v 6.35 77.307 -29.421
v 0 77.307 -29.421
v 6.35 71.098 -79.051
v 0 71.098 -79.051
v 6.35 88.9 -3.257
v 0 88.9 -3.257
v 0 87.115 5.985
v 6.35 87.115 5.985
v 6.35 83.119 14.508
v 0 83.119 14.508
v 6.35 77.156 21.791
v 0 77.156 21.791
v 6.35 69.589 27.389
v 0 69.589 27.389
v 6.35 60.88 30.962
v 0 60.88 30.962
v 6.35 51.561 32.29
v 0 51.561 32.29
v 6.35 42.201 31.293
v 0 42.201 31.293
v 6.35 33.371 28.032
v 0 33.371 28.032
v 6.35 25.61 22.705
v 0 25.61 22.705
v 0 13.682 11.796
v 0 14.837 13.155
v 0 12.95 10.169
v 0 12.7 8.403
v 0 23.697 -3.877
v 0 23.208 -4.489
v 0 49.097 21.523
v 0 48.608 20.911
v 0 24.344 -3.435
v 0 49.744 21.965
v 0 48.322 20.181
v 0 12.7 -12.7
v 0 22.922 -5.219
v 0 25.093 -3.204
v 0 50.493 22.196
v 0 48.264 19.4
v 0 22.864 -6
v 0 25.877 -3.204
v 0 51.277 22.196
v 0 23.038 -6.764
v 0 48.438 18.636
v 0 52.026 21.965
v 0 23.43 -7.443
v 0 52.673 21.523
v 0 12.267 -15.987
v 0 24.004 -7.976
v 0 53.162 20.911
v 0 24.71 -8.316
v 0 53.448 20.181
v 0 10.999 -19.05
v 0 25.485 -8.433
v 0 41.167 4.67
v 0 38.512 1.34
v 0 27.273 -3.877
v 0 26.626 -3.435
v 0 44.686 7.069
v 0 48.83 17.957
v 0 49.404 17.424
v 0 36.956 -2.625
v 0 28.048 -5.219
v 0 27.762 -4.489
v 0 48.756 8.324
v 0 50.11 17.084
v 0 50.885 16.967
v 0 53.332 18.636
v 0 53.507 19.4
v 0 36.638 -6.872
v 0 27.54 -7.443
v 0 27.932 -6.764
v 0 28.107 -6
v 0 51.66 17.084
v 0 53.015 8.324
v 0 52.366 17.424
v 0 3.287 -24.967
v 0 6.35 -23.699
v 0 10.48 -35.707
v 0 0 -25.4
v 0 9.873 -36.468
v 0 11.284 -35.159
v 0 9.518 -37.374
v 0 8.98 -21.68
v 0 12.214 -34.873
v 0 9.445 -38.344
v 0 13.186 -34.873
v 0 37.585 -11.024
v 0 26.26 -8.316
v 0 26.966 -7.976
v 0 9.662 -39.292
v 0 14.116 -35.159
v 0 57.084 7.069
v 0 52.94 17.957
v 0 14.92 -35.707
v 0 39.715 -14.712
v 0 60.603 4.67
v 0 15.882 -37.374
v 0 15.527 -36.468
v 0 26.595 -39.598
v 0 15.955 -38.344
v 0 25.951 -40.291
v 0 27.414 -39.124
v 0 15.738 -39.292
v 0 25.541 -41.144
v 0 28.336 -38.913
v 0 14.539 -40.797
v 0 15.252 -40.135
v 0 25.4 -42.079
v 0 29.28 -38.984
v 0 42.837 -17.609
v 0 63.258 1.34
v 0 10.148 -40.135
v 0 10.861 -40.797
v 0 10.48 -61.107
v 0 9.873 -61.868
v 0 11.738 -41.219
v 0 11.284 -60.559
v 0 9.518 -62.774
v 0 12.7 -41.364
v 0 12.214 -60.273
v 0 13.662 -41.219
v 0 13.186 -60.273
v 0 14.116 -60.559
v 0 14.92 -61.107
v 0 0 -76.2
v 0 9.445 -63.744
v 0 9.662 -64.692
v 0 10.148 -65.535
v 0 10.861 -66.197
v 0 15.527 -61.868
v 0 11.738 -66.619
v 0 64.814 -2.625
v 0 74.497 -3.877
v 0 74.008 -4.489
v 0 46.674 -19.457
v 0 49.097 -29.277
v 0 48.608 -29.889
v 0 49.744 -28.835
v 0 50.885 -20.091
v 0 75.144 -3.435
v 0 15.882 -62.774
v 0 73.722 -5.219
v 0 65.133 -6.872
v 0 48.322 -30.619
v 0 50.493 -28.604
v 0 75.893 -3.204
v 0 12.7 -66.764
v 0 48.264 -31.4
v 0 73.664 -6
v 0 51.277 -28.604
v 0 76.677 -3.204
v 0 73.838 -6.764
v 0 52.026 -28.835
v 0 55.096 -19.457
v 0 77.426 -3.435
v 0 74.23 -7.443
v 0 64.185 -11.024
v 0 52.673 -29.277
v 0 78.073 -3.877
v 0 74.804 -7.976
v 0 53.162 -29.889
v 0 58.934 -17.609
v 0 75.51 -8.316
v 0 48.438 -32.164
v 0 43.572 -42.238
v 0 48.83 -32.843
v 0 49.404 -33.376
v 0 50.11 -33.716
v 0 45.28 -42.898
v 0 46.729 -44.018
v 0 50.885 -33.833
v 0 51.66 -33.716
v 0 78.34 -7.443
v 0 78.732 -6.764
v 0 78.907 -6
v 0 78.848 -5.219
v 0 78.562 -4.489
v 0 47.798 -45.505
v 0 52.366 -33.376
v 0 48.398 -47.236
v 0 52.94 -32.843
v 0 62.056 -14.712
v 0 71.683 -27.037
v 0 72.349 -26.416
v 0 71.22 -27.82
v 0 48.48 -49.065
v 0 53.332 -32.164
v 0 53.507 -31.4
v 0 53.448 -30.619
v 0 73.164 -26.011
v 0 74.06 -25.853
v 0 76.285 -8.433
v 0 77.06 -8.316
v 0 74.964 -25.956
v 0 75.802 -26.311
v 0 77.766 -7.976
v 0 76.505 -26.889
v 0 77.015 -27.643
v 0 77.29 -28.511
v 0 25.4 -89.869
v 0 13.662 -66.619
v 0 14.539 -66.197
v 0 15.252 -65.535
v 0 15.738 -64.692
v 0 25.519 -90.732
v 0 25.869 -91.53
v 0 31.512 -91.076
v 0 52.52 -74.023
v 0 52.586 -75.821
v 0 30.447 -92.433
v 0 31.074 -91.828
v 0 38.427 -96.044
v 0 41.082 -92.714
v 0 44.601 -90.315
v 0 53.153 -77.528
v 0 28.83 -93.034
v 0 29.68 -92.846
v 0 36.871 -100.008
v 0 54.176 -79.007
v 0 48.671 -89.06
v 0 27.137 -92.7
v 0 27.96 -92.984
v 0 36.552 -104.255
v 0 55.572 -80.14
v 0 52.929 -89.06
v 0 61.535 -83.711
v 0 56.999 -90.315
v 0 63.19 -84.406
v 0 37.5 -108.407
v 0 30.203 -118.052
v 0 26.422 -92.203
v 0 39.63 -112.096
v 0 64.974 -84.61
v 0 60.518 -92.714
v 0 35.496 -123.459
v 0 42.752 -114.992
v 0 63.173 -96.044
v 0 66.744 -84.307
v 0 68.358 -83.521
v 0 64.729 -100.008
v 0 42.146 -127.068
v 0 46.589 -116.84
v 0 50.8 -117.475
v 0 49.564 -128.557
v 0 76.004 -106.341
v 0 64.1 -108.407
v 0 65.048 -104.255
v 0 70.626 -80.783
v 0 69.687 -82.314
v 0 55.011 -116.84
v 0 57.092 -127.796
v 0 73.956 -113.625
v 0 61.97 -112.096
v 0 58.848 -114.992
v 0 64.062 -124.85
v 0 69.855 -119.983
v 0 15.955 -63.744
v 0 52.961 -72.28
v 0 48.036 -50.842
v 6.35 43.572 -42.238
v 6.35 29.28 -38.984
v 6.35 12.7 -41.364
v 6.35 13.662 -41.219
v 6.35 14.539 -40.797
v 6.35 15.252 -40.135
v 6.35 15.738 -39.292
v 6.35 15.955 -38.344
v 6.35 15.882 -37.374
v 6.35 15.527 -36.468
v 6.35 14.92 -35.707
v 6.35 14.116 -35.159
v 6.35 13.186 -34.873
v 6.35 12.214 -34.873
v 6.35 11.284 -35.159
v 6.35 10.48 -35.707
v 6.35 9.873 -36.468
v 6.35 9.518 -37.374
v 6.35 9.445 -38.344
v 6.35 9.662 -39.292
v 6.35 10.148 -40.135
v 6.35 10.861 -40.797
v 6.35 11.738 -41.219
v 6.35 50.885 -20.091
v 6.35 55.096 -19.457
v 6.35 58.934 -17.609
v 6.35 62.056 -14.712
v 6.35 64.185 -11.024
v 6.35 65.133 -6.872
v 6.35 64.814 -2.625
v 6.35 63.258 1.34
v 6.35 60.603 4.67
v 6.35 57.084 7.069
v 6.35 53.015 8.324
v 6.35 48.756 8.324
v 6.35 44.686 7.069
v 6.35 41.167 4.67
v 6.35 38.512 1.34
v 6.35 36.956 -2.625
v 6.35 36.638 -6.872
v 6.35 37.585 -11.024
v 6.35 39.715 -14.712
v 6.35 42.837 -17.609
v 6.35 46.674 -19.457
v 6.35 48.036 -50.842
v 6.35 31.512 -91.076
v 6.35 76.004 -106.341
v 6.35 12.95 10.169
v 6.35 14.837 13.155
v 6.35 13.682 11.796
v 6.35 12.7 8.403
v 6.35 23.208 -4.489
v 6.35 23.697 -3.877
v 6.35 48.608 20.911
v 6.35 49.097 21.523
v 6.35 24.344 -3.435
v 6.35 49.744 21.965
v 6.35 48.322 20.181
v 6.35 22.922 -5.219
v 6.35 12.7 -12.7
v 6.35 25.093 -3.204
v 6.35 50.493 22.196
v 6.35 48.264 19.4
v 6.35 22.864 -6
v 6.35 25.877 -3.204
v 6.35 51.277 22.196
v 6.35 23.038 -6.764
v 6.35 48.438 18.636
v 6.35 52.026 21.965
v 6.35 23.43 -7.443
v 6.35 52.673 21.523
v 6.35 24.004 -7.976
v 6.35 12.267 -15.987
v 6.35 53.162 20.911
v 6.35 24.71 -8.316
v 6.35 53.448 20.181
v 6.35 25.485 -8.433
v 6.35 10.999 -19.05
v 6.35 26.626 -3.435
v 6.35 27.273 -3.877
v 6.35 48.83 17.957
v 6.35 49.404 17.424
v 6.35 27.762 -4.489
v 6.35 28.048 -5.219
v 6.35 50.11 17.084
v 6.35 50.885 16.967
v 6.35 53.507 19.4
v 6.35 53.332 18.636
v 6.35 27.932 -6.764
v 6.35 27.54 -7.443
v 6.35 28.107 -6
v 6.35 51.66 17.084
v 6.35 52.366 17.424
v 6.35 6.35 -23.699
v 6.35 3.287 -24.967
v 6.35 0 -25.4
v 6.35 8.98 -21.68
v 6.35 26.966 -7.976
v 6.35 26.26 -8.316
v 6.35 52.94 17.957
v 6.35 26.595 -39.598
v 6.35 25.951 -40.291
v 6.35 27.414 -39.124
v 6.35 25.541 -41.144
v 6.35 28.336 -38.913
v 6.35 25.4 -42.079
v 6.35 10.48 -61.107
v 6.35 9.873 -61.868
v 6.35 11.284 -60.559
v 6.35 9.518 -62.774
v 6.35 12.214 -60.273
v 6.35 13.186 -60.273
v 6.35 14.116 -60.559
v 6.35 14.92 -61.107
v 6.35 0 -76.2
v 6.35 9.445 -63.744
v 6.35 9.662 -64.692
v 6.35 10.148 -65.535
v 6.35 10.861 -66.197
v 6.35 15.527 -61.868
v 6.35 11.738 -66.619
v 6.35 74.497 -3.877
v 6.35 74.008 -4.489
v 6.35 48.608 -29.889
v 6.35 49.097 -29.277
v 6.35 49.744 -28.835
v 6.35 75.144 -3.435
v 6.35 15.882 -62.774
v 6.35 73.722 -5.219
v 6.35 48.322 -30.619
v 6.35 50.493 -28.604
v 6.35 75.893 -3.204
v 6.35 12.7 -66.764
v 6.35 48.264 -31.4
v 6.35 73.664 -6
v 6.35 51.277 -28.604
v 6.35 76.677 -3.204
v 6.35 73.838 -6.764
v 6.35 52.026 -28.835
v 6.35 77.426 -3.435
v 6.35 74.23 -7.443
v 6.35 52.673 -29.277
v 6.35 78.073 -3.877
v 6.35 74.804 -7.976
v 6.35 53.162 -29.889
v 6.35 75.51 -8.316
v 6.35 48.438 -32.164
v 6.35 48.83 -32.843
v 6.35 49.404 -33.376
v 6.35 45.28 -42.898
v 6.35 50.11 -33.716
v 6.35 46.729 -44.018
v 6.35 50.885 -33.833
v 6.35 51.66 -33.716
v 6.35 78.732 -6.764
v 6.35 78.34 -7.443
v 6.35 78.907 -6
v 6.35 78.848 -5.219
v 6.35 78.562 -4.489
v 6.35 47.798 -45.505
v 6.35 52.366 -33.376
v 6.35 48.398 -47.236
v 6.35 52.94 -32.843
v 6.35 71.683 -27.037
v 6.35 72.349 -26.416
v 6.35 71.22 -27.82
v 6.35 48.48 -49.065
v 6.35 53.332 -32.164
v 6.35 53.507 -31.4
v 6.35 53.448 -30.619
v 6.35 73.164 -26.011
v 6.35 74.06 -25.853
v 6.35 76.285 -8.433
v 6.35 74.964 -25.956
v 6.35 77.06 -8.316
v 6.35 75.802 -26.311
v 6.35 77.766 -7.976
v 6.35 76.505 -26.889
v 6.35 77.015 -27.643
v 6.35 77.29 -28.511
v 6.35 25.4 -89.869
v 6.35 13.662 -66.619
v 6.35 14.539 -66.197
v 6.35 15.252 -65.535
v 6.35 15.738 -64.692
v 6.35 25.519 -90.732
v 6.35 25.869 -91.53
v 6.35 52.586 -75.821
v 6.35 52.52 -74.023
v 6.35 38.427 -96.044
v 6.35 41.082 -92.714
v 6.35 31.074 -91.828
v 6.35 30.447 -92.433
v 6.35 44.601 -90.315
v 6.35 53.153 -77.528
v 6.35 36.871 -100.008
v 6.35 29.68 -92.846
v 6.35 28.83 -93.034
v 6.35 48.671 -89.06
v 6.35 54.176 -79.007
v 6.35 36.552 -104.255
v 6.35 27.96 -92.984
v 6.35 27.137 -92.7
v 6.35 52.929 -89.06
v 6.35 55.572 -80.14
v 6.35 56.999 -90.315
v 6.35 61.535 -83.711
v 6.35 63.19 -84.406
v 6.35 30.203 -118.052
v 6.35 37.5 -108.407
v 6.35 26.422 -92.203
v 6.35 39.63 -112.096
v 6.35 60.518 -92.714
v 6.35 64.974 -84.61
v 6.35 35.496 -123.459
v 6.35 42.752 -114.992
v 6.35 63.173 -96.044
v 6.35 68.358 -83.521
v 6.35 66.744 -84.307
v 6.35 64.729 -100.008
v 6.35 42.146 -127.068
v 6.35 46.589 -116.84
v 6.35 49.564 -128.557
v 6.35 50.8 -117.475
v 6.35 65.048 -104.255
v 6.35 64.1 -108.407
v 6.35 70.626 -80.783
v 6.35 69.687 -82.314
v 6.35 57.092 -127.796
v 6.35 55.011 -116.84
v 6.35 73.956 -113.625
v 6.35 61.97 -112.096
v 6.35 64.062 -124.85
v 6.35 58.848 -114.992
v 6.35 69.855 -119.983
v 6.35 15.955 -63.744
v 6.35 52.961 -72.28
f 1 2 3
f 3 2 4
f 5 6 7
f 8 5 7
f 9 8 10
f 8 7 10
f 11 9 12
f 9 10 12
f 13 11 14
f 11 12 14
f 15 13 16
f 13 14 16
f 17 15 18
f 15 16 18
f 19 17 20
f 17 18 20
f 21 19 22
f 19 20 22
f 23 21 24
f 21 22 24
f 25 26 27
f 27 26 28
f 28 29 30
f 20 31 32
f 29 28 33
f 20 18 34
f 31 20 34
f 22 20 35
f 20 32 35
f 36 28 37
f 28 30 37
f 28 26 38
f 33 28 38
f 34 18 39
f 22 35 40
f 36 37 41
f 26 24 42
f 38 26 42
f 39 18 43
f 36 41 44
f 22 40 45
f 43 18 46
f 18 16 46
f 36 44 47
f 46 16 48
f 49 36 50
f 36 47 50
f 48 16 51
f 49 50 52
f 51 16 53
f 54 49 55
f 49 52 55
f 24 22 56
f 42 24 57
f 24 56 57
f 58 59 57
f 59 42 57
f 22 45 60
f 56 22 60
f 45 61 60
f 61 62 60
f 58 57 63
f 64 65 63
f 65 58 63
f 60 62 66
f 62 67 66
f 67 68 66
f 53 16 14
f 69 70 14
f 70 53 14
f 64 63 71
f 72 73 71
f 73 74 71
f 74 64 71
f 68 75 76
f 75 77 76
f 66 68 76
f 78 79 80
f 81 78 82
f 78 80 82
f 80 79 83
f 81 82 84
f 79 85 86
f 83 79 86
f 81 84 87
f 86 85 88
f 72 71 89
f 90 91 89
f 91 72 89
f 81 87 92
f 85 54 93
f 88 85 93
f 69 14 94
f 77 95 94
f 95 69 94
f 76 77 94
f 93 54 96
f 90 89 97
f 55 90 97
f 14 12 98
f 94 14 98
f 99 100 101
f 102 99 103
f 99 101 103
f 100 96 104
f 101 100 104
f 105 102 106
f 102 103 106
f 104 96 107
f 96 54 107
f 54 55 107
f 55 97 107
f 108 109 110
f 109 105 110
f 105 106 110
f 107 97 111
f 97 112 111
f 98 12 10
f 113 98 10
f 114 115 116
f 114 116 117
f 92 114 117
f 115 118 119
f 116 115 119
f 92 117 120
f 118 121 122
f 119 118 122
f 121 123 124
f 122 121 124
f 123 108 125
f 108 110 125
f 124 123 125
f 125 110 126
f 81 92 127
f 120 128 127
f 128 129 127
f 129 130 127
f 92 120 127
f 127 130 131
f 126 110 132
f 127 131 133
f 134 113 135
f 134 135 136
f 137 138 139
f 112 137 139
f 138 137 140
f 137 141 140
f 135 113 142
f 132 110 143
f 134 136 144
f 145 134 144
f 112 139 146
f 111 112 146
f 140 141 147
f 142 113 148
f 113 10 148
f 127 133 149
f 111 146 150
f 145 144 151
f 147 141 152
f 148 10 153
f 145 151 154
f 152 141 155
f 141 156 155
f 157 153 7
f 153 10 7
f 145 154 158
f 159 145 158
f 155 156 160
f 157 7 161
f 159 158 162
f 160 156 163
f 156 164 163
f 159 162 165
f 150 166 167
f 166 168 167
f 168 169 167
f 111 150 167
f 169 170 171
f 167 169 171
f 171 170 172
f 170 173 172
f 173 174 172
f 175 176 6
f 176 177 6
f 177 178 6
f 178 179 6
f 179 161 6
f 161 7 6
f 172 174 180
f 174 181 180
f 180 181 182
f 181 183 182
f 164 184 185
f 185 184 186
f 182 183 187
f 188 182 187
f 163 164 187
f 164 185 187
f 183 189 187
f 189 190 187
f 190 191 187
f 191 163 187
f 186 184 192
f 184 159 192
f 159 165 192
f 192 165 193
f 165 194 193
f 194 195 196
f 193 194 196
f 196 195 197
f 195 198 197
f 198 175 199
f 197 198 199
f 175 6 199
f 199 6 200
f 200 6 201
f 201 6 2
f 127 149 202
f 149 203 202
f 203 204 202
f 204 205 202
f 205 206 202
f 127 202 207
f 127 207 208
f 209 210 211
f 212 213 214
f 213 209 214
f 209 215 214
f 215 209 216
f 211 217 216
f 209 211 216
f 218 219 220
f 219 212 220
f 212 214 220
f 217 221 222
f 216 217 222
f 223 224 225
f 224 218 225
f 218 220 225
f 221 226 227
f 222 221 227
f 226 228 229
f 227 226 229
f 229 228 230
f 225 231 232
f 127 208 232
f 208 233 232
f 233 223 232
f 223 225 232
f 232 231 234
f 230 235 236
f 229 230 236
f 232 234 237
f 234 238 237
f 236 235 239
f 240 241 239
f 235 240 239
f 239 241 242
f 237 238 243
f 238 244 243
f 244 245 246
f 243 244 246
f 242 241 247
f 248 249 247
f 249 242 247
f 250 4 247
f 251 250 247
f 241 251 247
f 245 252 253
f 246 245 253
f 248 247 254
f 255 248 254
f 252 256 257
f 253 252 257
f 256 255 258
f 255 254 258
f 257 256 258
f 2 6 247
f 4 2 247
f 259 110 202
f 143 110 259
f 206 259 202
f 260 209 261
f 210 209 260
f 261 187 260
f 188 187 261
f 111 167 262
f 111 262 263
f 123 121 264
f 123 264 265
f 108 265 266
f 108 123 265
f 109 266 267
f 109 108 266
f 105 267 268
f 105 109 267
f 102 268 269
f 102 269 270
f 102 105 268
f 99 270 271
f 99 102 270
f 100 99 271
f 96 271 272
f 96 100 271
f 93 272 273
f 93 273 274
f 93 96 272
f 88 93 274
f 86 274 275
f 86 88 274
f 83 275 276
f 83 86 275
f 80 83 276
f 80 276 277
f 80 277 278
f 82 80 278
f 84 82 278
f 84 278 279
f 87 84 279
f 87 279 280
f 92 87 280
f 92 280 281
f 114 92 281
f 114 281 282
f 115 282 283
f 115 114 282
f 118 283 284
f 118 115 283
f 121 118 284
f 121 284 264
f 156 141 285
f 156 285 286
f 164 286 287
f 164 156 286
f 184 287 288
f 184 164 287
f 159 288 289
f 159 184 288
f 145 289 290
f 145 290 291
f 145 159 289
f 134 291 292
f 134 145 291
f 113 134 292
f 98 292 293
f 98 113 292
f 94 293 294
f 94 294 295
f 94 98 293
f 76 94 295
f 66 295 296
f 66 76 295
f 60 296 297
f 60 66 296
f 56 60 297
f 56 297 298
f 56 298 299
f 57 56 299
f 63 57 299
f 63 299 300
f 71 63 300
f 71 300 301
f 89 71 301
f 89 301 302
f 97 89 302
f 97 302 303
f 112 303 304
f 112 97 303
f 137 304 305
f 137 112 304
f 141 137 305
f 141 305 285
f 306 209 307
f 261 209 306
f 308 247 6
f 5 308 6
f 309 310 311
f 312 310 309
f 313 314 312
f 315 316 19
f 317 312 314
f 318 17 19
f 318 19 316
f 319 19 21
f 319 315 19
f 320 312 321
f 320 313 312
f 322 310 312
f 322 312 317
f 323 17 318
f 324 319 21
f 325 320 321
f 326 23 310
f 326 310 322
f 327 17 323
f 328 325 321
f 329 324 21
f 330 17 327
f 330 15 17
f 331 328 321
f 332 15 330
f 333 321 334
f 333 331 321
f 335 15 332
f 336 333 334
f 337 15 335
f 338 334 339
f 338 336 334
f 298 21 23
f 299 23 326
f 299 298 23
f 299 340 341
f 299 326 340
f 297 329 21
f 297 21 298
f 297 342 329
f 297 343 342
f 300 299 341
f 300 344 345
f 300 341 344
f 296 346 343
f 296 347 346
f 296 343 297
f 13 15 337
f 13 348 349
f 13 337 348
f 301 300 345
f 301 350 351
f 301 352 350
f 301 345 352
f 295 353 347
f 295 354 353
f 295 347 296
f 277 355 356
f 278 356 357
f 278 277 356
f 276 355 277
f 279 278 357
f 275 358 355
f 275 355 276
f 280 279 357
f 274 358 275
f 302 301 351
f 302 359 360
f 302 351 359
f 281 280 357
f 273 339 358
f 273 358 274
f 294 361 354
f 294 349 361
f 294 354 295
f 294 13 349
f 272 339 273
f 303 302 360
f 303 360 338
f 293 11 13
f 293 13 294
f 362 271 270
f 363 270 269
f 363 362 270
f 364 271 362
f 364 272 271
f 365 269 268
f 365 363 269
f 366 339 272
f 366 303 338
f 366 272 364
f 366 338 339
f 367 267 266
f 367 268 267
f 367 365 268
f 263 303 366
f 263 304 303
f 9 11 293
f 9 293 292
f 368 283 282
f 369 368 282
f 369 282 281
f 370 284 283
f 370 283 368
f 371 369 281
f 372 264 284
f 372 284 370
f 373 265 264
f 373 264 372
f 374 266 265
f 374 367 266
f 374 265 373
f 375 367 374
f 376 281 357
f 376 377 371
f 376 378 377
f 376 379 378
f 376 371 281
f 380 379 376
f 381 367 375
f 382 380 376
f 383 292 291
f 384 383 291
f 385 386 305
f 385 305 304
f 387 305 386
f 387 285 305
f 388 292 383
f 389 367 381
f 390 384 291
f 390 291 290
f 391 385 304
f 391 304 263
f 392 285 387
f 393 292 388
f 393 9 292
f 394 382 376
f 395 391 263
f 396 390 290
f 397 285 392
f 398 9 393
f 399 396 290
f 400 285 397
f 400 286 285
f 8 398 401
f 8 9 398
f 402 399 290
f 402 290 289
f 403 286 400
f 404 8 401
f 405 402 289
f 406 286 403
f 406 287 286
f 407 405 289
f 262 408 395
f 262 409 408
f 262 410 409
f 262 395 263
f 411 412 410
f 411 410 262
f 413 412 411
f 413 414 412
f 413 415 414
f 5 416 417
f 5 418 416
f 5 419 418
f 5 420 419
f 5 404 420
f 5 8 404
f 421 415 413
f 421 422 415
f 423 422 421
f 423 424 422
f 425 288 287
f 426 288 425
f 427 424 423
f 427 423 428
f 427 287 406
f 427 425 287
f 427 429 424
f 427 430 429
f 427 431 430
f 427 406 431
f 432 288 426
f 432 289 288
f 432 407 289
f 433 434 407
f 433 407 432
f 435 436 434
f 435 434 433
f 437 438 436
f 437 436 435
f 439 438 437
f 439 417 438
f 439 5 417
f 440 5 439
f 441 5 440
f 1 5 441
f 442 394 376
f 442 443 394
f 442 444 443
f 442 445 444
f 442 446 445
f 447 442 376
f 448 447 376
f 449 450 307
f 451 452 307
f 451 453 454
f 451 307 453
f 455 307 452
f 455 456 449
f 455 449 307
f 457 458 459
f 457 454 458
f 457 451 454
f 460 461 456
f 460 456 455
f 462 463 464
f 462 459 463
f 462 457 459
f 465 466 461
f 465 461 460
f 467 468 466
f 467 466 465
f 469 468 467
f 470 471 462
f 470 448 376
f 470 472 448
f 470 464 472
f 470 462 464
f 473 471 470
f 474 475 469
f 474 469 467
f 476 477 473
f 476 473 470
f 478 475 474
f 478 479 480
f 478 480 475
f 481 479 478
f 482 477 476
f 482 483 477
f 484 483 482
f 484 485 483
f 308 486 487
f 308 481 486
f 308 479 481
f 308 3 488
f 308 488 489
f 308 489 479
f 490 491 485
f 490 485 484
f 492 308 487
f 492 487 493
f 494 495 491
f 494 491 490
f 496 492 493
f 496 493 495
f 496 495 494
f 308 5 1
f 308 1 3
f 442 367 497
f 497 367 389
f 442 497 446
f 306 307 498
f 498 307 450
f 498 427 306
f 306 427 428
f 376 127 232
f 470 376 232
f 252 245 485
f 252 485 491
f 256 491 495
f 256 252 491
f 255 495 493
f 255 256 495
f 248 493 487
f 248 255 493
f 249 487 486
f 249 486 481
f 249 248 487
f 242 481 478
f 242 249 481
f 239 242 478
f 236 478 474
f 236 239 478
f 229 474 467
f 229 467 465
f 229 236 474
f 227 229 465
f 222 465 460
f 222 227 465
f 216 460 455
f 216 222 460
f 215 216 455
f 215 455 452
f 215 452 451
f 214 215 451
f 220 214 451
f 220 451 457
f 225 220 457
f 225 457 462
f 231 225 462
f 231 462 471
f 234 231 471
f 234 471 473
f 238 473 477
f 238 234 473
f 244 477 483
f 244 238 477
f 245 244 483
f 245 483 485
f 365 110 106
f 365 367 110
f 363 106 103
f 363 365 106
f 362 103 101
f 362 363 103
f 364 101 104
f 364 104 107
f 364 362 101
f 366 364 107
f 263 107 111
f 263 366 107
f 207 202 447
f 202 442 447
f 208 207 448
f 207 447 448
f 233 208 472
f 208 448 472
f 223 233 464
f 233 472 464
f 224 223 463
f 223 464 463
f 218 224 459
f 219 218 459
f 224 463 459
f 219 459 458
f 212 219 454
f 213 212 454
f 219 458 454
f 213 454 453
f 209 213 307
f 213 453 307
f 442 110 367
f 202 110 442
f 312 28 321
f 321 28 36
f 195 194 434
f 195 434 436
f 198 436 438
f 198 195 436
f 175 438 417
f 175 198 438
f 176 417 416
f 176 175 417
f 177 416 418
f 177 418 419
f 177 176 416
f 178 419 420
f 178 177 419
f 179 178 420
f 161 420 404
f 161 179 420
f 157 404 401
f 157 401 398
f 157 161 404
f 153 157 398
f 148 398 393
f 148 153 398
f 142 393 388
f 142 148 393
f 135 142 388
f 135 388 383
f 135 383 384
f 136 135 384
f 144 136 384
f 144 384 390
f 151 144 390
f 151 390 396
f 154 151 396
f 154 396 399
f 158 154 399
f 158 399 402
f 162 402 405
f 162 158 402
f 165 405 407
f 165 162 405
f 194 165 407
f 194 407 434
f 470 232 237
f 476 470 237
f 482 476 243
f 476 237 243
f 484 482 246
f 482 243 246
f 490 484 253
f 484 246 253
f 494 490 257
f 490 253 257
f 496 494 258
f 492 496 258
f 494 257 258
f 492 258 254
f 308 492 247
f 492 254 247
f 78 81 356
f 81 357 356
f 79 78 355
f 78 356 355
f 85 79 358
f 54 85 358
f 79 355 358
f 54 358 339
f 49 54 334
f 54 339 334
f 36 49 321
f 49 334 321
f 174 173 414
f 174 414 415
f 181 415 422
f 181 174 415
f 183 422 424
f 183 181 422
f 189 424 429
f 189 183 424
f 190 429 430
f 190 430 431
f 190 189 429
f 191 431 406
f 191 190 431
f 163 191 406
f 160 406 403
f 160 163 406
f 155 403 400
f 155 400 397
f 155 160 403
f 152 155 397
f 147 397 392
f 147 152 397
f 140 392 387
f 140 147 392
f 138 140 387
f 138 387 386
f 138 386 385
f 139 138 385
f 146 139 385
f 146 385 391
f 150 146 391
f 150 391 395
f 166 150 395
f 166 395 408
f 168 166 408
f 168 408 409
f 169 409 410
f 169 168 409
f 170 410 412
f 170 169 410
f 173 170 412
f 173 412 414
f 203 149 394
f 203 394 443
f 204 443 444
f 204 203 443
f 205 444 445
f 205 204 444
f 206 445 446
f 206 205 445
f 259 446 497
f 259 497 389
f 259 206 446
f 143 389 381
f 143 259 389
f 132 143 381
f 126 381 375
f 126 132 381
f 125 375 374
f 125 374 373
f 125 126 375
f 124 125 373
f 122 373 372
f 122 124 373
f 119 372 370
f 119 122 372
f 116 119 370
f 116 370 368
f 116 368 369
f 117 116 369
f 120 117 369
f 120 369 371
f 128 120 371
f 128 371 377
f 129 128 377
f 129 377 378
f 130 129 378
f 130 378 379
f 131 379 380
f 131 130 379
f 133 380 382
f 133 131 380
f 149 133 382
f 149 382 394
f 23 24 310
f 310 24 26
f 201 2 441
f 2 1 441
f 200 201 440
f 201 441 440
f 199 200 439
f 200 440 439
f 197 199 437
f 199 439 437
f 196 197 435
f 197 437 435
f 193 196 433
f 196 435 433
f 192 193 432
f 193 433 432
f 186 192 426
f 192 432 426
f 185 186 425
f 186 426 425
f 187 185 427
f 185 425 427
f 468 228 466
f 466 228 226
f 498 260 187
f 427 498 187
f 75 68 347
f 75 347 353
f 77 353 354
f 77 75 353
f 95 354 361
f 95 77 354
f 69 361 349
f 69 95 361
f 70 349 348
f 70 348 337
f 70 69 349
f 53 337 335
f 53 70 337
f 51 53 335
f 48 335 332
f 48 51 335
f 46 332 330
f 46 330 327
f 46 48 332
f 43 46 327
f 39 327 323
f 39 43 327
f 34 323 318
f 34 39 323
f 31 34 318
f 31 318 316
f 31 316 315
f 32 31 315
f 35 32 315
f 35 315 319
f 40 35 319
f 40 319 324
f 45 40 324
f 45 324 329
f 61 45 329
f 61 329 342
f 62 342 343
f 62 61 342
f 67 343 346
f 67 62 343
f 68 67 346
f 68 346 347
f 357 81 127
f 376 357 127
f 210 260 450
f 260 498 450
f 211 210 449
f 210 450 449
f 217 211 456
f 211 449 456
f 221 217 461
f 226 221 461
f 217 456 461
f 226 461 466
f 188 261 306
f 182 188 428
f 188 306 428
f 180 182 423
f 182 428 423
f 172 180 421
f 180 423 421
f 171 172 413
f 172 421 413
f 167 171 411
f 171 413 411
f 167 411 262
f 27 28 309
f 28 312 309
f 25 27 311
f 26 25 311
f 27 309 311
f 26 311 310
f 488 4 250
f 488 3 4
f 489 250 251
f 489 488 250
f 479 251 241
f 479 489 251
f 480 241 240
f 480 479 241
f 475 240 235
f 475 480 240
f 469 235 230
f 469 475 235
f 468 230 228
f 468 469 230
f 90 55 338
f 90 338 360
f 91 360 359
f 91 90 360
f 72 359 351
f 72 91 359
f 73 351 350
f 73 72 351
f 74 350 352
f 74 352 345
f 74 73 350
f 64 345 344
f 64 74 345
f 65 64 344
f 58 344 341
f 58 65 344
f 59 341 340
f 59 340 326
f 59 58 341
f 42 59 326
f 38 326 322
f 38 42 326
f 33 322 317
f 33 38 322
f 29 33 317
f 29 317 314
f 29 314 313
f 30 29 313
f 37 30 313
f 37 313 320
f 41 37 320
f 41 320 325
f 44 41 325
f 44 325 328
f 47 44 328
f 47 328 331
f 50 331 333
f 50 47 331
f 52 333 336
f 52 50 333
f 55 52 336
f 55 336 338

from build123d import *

# Parameters (mm, degrees)
SKETCH1_R           = 3.2639
SKETCH1_R_2         = 14.2875
SKETCH1_R_3         = 2.6289
BOSS_EXTRUDE1_DEPTH = 6.35
CUT_EXTRUDE1_DEPTH  = 6.35
CUT_EXTRUDE2_DEPTH  = 157.455309971
FILLET1_R           = 6.35
FILLET2_R           = 6.35
FILLET3_R           = 3.175
FILLET4_R           = 6.35
FILLET5_R           = 3.175
FILLET6_R           = 3.175
FILLET7_R           = 12.7
FILLET8_R           = 6.35


with BuildPart() as part:
    # Sketch1 → Boss-Extrude1 (new body)
    with BuildSketch(Plane(origin=(0, 0, 0), x_dir=(0, 0, -1), z_dir=(1, 0, 0))):
        with BuildLine():
            Line((0, 0), (76.2, 0))
            Line((76.2, 0), (118.05161028, 30.203441414))
            ThreePointArc((118.05161028, 30.203441414), (127.79577467, 57.092282399), (106.340627785, 76.003527237))
            Line((106.340627785, 76.003527237), (3.257374761, 88.899923295))
            ThreePointArc((3.257374761, 88.899923295), (-29.445545679, 65.344858986), (-22.705011853, 25.609644583))
            Line((-22.705011853, 25.609644583), (0, 0))
        make_face()
        with Locations((38.1, 12.7)):
            Circle(SKETCH1_R, mode=Mode.SUBTRACT)
        with Locations((63.5, 12.7)):
            Circle(SKETCH1_R, mode=Mode.SUBTRACT)
        with Locations((103.1875, 50.8)):
            Circle(SKETCH1_R_2, mode=Mode.SUBTRACT)
        with Locations((5.803937203, 50.885123286)):
            Circle(SKETCH1_R_2, mode=Mode.SUBTRACT)
        with Locations((5.803937203, 76.285123286)):
            Circle(SKETCH1_R_3, mode=Mode.SUBTRACT)
        with Locations((5.803937203, 25.485123286)):
            Circle(SKETCH1_R_3, mode=Mode.SUBTRACT)
        with Locations((31.203937203, 50.885123286)):
            Circle(SKETCH1_R_3, mode=Mode.SUBTRACT)
        with Locations((-19.596062797, 50.885123286)):
            Circle(SKETCH1_R_3, mode=Mode.SUBTRACT)
    extrude(amount=BOSS_EXTRUDE1_DEPTH)

    # Sketch2 → Cut-Extrude1 (cut)
    with BuildSketch(Plane.ZY):
        Polygon((0, 0), (-25.4, 0), (-25.4, 12.7), (0, 12.7), (11.95076388, 12.7), (11.95076388, 0), align=None)
    extrude(amount=-CUT_EXTRUDE1_DEPTH, mode=Mode.SUBTRACT)

    # Sketch3 → Cut-Extrude2 (cut, through all)
    with BuildSketch(Plane.ZY):
        Polygon((-105.957463546, 25.4), (-43.903937203, 50.885123286), (-38.1, 25.4), align=None)
        Polygon((-88.713516137, 69.889443956), (-77.333414898, 50.885123286), (-5.803937203, 80.261980092), align=None)
    extrude(amount=-CUT_EXTRUDE2_DEPTH, mode=Mode.SUBTRACT)

    # Fillet1
    fillet1_edges = [part.edges().sort_by_distance(p)[0] for p in [
        (3.175, 50.885123286, -77.333414898),
    ]]
    fillet(fillet1_edges, radius=FILLET1_R)

    # Fillet2
    fillet2_edges = [part.edges().sort_by_distance(p)[0] for p in [
        (3.175, 69.889443956, -88.713516137),
    ]]
    fillet(fillet2_edges, radius=FILLET2_R)

    # Fillet3
    fillet3_edges = [part.edges().sort_by_distance(p)[0] for p in [
        (3.175, 80.261980092, -5.803937203),
    ]]
    fillet(fillet3_edges, radius=FILLET3_R)

    # Fillet4
    fillet4_edges = [part.edges().sort_by_distance(p)[0] for p in [
        (3.175, 50.885123286, -43.903937203),
    ]]
    fillet(fillet4_edges, radius=FILLET4_R)

    # Fillet5
    fillet5_edges = [part.edges().sort_by_distance(p)[0] for p in [
        (3.175, 25.4, -38.1),
    ]]
    fillet(fillet5_edges, radius=FILLET5_R)

    # Fillet6
    fillet6_edges = [part.edges().sort_by_distance(p)[0] for p in [
        (3.175, 25.4, -105.957463546),
    ]]
    fillet(fillet6_edges, radius=FILLET6_R)

    # Fillet7
    fillet7_edges = [part.edges().sort_by_distance(p)[0] for p in [
        (3.175, 12.7, -25.4),
    ]]
    fillet(fillet7_edges, radius=FILLET7_R - 0.0001)  # a hair under: the kernel refuses the full size

    # Fillet8
    fillet8_edges = [part.edges().sort_by_distance(p)[0] for p in [
        (3.175, 12.7, 11.259572526),
    ]]
    fillet(fillet8_edges, radius=FILLET8_R)


solid = part.part
